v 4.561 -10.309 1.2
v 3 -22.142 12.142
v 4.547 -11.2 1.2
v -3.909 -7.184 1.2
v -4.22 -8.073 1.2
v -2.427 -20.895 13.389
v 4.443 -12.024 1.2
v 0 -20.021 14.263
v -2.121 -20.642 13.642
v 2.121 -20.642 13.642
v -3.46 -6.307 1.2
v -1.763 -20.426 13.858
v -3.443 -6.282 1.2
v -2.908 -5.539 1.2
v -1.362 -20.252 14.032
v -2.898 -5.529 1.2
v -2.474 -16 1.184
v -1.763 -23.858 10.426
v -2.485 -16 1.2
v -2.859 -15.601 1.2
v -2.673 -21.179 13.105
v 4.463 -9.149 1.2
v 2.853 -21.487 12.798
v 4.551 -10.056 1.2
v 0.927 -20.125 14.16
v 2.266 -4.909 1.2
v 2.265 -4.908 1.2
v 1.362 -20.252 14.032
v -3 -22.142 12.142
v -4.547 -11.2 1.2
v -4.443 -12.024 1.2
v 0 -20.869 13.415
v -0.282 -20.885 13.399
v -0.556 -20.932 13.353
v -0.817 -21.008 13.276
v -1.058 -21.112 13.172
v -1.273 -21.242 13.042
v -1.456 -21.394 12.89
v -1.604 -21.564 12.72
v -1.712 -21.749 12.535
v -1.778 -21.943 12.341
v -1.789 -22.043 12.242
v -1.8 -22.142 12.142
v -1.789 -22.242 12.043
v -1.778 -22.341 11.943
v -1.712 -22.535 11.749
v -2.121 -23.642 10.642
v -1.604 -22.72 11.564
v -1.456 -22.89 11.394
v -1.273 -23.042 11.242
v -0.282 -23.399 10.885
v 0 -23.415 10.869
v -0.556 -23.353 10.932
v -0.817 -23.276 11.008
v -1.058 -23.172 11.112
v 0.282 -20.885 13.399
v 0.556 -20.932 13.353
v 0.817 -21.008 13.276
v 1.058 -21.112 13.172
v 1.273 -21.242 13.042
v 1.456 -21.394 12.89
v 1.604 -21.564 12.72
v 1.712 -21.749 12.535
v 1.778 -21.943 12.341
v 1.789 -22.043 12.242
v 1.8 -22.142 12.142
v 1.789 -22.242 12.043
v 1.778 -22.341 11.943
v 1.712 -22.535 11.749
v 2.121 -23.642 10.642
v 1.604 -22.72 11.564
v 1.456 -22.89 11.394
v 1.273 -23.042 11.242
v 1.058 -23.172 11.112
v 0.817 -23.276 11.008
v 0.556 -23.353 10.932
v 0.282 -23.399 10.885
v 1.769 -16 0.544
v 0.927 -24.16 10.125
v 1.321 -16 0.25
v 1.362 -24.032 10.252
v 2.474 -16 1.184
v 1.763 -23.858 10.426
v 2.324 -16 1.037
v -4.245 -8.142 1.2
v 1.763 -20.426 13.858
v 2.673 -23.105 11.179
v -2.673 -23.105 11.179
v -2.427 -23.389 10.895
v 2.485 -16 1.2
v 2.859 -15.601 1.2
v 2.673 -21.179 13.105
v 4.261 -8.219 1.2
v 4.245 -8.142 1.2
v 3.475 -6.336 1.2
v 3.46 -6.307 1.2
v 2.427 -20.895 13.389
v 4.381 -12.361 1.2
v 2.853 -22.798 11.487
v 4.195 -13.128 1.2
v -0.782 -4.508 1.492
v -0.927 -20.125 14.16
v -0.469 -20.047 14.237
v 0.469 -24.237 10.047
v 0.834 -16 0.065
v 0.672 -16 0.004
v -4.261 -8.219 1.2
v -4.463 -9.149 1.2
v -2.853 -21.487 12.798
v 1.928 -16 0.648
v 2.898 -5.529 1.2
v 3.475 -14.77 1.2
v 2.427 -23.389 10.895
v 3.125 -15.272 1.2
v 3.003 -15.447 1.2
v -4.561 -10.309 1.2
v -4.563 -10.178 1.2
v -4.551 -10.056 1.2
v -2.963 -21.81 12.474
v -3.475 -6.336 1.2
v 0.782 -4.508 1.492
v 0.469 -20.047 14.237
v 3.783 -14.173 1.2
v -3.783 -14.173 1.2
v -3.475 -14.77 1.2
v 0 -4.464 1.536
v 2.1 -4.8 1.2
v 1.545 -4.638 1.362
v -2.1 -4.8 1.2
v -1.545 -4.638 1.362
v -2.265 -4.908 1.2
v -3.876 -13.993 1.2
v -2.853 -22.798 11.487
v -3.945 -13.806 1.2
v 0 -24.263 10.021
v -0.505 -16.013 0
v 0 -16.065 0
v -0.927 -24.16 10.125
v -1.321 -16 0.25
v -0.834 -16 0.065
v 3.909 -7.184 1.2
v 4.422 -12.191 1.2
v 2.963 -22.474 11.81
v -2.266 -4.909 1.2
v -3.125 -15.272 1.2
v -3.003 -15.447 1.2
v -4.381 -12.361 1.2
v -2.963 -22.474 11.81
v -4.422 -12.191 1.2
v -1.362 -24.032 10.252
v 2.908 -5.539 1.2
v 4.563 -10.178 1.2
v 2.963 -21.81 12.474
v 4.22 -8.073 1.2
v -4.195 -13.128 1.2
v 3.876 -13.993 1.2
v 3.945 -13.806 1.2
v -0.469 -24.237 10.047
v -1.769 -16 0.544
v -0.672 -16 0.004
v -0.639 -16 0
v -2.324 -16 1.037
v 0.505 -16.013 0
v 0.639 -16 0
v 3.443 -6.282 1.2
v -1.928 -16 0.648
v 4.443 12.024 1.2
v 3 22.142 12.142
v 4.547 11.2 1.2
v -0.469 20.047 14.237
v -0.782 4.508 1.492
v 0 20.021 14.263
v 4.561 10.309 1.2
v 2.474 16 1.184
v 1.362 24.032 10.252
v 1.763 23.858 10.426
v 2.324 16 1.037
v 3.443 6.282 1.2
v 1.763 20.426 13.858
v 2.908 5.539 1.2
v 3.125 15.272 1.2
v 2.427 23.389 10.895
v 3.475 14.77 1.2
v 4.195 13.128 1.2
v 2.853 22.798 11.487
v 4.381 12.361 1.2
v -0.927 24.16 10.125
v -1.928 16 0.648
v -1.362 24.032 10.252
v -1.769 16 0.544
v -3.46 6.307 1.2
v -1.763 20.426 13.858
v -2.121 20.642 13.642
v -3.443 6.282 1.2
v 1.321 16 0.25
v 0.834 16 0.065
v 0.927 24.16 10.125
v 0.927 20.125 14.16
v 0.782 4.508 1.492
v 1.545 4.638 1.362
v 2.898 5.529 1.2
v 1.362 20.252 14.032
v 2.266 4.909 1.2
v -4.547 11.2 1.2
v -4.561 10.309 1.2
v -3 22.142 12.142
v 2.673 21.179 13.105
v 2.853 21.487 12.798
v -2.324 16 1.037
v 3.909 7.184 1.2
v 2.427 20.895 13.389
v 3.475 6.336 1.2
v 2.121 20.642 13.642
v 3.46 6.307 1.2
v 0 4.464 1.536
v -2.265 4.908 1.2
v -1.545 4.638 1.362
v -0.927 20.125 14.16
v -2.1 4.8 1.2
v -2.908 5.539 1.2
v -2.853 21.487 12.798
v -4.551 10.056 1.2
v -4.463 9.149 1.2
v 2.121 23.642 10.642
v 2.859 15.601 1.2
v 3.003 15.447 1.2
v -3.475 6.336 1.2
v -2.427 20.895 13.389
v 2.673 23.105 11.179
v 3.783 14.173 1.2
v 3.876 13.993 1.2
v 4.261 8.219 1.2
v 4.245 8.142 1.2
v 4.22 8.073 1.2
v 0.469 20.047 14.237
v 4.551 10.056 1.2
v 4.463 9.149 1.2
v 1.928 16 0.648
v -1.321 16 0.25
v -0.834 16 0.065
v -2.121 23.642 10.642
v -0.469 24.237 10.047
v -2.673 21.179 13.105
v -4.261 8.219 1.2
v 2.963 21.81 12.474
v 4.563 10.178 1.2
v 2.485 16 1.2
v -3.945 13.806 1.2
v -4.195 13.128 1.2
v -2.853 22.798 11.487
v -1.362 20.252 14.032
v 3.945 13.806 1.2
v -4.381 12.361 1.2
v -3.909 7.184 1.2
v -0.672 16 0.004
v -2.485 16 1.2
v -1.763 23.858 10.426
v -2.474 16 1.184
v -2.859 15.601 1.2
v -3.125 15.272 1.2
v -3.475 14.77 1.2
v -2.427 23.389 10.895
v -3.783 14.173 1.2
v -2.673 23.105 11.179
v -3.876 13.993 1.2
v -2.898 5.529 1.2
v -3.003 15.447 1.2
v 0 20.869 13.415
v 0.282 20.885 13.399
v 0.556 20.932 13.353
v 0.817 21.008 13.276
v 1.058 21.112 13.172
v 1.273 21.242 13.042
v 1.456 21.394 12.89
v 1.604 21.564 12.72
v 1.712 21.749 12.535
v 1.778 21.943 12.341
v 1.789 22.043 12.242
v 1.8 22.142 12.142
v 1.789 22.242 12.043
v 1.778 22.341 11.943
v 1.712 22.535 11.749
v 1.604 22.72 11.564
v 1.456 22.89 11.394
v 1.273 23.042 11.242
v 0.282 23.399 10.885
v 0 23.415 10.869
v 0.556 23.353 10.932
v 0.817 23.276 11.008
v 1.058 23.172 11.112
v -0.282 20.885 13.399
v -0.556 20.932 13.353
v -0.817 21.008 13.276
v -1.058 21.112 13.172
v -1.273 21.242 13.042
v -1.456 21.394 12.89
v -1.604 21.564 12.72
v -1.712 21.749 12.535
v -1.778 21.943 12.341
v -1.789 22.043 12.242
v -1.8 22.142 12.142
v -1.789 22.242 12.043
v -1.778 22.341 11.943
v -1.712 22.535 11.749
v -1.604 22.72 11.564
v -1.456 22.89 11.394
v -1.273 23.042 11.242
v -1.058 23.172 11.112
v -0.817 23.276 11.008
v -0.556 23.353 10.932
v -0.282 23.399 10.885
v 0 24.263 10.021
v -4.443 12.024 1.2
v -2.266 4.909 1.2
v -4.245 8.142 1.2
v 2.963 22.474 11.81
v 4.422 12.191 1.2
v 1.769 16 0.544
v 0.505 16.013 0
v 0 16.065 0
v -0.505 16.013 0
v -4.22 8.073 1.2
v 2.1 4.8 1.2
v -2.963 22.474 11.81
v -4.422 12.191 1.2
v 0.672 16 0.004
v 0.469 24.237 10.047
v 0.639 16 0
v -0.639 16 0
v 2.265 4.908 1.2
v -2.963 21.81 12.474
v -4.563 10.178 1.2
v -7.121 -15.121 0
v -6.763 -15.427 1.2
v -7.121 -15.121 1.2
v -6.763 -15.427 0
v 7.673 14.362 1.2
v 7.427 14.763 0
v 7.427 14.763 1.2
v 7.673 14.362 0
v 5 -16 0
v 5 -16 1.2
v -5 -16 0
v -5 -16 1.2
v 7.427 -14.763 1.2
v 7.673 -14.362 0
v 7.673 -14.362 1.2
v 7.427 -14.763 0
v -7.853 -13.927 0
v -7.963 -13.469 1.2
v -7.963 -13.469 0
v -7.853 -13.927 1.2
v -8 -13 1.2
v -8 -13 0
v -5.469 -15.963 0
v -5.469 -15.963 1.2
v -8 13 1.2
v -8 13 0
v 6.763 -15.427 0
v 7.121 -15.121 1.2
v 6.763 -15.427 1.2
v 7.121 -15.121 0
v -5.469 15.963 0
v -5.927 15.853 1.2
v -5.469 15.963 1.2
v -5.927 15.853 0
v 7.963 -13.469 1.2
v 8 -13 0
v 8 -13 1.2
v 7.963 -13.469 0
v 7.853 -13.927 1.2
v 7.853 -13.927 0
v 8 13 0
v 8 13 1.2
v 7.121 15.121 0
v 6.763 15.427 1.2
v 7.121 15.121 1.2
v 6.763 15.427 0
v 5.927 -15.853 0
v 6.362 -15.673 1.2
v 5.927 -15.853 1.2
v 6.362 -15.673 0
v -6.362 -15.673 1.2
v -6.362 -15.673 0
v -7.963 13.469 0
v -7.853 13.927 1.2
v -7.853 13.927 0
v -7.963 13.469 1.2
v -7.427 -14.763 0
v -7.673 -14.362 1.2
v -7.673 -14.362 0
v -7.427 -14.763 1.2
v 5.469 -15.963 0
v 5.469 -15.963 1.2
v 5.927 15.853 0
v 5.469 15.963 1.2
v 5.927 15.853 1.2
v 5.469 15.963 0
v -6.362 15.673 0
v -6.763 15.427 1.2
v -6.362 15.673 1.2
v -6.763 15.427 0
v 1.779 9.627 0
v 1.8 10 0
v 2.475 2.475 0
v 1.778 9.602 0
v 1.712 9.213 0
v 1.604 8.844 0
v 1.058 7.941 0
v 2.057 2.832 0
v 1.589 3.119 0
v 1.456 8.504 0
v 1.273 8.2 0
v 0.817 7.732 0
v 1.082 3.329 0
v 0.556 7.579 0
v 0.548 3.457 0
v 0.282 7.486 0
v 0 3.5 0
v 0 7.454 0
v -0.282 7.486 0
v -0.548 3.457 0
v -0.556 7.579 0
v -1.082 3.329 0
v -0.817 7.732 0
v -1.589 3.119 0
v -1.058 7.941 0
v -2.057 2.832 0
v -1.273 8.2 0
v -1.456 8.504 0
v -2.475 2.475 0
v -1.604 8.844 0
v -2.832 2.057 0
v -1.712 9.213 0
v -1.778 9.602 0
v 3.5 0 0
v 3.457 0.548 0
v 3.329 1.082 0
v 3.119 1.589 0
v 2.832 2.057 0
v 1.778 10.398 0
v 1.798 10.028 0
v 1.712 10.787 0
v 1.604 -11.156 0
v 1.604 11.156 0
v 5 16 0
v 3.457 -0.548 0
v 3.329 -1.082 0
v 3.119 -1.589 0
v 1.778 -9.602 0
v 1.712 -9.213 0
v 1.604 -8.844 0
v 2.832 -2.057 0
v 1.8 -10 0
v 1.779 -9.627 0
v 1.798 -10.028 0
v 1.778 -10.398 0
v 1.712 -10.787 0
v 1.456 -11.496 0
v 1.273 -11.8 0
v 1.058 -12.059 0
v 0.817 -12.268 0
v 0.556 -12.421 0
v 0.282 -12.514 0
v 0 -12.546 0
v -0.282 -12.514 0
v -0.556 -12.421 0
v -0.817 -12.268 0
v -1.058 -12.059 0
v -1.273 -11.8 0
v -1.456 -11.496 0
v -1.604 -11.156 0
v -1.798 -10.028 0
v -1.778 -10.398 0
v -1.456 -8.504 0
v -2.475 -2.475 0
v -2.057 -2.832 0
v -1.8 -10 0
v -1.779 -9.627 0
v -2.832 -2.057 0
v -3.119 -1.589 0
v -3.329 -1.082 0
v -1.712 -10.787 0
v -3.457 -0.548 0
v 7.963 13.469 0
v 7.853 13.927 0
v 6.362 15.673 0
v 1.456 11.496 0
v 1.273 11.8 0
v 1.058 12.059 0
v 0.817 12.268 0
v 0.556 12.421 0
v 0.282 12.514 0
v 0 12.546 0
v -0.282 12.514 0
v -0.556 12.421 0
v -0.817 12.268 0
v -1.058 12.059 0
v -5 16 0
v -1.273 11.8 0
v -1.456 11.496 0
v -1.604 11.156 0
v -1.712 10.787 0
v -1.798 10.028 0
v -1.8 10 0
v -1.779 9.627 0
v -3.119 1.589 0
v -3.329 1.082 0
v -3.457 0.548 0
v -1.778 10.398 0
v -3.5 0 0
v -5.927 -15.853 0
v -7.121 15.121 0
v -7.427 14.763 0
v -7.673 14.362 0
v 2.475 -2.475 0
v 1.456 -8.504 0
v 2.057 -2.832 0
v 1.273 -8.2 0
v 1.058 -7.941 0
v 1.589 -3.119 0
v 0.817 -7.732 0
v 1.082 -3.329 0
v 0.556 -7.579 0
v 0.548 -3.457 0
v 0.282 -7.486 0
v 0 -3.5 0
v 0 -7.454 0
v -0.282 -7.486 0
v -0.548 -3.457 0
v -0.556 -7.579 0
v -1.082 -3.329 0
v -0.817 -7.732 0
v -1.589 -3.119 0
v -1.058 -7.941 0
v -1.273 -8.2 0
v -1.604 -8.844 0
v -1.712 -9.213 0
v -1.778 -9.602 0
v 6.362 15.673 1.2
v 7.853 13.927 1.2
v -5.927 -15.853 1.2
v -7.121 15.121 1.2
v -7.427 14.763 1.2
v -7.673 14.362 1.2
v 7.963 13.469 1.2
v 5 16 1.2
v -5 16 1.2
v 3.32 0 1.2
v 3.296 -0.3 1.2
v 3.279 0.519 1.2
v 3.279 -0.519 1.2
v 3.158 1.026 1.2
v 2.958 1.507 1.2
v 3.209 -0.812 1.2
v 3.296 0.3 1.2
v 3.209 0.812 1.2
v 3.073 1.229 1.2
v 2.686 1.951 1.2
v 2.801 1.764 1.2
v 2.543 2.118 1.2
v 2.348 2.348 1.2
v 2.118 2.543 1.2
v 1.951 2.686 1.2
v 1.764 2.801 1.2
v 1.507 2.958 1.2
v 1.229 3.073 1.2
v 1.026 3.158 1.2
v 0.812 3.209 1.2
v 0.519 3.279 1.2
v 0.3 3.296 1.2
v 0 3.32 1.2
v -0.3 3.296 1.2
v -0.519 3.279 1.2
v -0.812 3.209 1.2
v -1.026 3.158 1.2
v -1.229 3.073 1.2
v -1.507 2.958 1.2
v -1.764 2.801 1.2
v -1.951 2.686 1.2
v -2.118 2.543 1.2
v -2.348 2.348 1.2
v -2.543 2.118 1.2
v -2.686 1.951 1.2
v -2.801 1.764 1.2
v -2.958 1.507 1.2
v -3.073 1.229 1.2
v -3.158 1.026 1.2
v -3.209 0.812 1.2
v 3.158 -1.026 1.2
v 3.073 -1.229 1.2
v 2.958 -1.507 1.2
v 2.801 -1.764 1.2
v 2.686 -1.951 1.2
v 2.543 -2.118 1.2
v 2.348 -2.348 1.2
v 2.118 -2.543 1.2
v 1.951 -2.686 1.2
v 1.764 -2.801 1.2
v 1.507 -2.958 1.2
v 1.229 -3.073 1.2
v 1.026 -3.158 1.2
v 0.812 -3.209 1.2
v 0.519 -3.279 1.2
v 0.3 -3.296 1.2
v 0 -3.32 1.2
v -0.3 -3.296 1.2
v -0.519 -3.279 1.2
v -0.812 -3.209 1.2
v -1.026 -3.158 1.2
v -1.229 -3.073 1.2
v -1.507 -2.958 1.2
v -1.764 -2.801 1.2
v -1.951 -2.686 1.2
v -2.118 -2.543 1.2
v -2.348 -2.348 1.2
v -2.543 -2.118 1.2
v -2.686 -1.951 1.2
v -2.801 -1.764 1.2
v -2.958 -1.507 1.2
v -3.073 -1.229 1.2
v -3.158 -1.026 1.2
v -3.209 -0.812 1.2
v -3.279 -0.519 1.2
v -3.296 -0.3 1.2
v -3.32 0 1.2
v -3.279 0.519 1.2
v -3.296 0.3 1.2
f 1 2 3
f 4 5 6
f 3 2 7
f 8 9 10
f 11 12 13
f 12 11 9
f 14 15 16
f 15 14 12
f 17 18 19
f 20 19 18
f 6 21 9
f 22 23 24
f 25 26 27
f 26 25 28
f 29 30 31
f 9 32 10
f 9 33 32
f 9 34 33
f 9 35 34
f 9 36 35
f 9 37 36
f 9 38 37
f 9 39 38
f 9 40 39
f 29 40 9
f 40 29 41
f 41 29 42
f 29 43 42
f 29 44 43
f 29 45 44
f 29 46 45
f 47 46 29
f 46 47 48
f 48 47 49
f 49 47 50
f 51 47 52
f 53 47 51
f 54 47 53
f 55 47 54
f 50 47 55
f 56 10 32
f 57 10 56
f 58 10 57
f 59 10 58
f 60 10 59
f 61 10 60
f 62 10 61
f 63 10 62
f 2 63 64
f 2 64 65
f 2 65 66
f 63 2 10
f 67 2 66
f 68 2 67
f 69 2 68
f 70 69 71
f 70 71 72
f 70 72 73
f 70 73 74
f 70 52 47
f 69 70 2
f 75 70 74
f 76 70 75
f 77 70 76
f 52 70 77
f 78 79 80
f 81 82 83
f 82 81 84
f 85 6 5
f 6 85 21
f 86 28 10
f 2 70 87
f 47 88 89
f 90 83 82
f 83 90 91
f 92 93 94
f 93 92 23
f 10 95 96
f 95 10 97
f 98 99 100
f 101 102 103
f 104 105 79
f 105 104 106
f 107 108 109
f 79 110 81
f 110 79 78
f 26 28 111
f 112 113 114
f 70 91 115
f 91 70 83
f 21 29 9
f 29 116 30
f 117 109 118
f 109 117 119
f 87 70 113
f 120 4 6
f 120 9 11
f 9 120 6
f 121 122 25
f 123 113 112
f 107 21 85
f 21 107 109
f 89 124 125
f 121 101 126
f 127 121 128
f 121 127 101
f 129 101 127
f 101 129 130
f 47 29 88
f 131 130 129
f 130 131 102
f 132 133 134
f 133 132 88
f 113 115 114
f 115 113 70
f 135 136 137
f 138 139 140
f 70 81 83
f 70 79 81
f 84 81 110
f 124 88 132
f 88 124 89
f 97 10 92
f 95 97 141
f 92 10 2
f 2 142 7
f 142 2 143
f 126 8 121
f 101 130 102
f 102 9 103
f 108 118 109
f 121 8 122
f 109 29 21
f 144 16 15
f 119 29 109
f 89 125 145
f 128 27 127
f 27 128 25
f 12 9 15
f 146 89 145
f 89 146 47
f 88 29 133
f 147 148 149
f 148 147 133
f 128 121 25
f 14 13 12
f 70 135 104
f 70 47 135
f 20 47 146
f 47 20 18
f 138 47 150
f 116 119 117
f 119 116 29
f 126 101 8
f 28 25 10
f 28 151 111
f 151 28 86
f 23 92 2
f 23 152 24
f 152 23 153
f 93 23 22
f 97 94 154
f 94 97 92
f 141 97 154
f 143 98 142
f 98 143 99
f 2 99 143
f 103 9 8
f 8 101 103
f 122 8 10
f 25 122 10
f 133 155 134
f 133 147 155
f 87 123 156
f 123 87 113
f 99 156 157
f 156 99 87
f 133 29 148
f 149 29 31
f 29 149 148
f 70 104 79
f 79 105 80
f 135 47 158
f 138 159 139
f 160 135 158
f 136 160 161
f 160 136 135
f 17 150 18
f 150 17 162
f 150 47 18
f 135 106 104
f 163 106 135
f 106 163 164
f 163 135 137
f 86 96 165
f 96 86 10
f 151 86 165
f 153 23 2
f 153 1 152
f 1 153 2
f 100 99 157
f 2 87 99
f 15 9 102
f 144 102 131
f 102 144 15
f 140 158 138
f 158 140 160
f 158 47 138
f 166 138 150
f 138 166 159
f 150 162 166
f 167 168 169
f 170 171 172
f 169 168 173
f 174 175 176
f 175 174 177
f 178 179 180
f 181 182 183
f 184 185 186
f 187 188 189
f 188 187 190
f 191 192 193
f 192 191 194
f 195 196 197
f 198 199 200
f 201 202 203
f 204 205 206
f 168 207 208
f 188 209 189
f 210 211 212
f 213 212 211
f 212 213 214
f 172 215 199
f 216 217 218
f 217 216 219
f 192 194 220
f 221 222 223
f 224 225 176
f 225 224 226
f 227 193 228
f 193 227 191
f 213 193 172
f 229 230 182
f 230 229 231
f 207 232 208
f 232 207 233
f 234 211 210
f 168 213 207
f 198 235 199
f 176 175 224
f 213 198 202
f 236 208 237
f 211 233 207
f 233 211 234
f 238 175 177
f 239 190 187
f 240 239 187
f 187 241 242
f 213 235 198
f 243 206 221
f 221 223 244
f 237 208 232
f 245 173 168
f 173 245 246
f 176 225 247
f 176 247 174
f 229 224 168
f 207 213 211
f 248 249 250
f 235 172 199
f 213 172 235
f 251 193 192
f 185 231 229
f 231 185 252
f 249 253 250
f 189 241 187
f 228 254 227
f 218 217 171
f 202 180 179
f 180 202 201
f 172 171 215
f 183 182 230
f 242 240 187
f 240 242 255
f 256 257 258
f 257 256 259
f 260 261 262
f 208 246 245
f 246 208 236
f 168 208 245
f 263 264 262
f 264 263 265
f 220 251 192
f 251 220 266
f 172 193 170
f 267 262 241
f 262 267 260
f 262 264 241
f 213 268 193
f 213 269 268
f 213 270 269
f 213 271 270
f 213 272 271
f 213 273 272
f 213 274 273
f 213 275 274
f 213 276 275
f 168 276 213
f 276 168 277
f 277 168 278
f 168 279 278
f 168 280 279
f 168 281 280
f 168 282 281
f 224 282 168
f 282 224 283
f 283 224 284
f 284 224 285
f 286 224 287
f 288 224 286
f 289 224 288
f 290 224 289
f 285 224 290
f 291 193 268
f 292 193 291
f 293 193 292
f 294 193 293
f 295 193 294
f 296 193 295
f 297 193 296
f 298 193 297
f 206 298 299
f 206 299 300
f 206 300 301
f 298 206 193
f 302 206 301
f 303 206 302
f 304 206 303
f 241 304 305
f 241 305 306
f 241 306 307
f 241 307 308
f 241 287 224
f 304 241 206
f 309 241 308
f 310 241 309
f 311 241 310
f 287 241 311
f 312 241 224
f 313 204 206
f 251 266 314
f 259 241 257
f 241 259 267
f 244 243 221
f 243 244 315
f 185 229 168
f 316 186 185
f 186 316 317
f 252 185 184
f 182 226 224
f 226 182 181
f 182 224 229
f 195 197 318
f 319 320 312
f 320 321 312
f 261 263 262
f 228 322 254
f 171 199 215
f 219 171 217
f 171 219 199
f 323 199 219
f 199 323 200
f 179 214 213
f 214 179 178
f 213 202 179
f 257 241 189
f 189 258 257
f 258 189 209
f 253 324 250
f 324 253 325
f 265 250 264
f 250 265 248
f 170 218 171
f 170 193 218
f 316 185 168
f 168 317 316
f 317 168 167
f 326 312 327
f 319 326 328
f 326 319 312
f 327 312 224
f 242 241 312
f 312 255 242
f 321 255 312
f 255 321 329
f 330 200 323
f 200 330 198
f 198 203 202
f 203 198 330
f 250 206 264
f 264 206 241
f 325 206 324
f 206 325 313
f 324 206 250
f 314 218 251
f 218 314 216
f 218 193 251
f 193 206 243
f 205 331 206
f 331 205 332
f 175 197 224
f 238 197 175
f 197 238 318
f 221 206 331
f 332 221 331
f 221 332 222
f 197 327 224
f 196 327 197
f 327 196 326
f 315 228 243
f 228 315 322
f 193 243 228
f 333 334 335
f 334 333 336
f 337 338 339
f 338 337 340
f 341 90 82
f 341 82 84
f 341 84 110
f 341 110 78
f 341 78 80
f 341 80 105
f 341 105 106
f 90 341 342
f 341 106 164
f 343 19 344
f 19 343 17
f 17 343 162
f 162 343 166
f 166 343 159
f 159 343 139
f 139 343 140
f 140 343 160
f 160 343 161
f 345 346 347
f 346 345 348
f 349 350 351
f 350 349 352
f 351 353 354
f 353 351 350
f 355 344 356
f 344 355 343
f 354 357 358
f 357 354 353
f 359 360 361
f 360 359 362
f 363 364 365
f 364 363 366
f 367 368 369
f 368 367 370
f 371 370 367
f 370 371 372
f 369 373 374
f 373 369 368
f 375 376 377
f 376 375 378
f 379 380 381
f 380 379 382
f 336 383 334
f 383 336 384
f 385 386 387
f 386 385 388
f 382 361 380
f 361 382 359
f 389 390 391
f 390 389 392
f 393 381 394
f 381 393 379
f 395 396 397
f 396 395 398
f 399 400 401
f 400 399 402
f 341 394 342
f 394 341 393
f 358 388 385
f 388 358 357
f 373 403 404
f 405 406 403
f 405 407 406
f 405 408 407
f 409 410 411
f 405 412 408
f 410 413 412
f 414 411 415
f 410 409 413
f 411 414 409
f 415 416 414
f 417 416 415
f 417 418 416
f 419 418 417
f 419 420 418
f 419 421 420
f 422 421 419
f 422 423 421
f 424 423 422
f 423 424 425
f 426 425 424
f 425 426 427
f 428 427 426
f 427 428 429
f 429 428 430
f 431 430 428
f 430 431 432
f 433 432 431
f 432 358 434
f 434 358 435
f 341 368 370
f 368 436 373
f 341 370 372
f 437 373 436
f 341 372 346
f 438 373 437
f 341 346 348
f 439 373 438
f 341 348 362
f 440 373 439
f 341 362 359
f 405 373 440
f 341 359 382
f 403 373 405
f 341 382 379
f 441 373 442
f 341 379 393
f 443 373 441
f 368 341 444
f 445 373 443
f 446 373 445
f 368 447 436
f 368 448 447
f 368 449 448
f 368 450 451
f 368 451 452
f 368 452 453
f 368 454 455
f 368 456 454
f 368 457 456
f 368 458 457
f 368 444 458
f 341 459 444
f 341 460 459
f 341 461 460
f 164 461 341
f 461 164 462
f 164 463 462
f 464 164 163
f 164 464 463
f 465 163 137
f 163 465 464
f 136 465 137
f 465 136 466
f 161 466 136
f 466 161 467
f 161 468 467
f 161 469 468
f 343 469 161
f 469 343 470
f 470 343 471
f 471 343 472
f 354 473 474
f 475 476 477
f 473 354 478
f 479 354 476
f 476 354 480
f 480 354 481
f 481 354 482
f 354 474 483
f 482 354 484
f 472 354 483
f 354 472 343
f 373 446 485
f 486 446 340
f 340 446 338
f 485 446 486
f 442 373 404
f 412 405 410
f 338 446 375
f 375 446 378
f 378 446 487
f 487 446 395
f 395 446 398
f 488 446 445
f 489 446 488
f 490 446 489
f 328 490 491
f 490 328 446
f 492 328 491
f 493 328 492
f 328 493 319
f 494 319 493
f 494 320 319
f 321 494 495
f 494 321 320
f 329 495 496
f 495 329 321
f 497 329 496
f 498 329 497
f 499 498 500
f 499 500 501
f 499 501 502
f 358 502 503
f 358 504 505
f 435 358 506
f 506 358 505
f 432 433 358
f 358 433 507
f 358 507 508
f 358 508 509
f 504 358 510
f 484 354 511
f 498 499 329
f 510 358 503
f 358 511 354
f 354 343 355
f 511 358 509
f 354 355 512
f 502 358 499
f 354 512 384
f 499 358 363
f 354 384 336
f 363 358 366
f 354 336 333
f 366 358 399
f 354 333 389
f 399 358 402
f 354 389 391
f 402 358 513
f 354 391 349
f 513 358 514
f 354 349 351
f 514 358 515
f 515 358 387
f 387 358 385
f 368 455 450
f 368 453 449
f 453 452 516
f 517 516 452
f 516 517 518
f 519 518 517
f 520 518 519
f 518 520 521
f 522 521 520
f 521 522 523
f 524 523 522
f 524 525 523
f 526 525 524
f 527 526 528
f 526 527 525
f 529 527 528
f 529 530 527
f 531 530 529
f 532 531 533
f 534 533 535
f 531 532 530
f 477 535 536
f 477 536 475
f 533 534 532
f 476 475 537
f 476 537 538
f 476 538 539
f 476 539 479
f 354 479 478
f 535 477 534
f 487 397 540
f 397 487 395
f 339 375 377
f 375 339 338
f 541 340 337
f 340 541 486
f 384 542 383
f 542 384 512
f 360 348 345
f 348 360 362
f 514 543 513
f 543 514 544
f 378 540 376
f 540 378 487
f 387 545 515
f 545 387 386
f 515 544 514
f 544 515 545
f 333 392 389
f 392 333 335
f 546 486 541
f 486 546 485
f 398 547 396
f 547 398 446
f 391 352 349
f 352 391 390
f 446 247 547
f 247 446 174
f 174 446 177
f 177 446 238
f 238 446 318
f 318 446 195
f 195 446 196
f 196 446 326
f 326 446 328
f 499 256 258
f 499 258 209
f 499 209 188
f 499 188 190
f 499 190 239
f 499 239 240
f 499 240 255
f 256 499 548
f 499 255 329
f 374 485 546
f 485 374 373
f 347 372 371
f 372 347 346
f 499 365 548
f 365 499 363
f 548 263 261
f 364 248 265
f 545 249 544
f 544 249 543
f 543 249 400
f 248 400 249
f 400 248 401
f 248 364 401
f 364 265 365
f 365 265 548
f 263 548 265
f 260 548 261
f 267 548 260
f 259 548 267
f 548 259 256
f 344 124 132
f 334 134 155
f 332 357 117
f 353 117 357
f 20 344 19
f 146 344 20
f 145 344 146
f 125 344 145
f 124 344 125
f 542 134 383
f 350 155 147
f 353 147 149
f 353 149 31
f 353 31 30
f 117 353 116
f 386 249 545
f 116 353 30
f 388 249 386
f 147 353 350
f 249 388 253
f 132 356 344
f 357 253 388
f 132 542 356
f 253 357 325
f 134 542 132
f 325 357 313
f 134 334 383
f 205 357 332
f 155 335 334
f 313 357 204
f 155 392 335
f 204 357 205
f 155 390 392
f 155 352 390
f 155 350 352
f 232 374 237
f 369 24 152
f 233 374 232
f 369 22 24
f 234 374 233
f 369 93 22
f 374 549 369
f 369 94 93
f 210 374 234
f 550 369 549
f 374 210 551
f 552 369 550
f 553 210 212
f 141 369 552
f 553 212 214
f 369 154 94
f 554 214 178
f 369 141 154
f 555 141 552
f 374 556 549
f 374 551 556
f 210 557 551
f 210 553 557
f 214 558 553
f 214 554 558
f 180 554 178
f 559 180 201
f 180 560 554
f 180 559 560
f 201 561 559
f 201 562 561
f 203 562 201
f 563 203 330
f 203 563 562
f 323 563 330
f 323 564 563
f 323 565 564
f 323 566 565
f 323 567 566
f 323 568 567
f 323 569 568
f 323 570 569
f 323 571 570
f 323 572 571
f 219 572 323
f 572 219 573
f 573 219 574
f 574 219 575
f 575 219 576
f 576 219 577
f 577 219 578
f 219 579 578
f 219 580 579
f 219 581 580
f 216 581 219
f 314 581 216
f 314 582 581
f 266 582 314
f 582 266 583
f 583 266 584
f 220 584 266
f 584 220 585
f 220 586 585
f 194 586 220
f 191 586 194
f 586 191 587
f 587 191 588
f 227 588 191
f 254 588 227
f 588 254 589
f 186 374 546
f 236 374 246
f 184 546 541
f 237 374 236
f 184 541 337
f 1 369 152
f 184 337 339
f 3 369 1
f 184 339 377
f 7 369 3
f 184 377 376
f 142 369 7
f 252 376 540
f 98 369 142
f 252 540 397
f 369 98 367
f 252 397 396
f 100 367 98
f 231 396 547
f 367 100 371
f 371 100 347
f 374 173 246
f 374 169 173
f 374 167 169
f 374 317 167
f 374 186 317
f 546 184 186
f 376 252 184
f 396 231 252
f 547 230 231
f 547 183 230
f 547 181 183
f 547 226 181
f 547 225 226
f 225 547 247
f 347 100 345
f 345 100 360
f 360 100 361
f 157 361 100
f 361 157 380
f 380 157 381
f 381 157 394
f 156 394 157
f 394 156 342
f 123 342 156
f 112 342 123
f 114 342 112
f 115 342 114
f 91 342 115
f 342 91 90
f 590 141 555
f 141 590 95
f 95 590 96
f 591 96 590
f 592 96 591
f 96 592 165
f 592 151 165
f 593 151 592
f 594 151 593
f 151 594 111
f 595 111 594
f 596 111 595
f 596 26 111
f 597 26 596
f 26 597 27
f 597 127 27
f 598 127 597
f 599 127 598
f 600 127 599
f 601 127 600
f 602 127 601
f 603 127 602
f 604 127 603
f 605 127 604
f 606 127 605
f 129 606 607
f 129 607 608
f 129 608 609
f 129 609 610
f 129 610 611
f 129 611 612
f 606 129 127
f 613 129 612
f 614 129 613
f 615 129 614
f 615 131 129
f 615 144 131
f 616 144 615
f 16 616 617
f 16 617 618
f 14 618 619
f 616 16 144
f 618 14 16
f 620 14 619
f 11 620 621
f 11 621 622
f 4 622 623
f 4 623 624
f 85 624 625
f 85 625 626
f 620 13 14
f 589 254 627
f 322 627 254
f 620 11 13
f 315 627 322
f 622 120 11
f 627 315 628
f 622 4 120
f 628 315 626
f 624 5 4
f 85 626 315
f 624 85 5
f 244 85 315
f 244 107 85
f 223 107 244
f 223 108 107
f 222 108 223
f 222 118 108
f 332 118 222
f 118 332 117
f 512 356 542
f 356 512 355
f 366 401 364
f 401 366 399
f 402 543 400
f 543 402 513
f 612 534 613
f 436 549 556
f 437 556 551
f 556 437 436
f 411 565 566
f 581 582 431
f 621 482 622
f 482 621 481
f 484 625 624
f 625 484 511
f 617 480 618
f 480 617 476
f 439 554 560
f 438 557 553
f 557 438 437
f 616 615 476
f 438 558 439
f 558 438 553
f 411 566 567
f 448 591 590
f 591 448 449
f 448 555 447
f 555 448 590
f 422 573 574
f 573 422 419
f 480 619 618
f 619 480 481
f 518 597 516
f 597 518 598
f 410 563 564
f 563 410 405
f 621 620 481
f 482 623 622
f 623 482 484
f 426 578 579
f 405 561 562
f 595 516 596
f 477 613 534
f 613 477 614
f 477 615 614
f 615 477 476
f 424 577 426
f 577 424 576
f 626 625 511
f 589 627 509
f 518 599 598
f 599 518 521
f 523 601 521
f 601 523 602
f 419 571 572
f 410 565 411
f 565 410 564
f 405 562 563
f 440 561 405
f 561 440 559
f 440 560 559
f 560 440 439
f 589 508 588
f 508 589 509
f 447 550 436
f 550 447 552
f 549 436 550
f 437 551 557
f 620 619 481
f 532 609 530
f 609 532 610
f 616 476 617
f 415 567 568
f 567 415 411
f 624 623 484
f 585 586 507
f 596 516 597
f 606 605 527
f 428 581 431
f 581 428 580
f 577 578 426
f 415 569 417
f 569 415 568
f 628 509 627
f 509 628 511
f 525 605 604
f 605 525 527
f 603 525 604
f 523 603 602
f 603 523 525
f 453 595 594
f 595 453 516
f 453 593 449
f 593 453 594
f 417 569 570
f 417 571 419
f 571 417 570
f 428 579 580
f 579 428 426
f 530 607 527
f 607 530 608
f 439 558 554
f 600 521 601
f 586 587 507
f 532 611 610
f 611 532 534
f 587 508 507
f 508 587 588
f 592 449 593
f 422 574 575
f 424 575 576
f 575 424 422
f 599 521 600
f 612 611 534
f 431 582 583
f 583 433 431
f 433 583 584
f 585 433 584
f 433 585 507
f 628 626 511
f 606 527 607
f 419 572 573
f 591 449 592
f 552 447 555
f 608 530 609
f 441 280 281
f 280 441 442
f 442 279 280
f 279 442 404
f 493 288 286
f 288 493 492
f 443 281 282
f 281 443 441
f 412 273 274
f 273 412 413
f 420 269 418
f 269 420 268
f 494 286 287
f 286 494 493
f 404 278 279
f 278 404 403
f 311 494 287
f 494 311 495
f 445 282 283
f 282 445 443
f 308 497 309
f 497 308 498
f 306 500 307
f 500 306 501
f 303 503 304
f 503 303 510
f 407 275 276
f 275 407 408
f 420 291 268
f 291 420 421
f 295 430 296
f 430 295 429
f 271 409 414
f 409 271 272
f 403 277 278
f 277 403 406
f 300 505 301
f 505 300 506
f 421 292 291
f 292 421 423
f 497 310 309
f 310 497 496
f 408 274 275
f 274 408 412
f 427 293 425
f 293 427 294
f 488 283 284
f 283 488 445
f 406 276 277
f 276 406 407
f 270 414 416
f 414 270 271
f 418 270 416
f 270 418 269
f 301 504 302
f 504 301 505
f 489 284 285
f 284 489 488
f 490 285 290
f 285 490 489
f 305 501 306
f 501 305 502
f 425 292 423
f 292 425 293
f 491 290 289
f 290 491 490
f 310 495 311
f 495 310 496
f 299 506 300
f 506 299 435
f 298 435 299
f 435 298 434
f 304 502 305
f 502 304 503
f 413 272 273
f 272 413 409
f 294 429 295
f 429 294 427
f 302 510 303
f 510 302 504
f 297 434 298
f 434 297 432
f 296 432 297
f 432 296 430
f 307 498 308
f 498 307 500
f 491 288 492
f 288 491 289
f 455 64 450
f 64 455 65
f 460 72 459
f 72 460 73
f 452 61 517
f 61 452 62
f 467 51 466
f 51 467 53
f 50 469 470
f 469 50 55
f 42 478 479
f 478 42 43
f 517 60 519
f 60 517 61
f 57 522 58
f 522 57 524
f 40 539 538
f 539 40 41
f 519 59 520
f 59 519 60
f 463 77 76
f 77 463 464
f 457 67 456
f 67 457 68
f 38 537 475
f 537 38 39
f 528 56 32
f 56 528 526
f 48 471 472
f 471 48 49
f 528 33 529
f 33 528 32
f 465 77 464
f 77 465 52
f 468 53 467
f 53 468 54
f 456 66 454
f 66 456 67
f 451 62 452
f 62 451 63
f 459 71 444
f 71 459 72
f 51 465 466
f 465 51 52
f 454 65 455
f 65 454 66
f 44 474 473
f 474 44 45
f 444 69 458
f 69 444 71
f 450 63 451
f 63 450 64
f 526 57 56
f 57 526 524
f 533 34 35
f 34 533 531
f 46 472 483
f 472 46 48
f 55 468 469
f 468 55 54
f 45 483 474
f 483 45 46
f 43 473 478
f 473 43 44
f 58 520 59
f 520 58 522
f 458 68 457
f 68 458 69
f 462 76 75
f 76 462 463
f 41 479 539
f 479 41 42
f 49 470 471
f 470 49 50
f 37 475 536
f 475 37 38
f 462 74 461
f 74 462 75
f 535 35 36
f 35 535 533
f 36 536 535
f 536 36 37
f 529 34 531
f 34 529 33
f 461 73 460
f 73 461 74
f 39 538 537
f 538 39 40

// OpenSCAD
/*
Antenna holder for Armattan F1-5 (c) by Jorge Monteiro

Antenna holder for Armattan F1-5 is licensed under a
Creative Commons Attribution-ShareAlike 4.0 International.

You should have received a copy of the license along with this
work.  If not, see <http://creativecommons.org/licenses/by-sa/4.0/>.
*/


$fn = 40*1;
/* [Basics] */
// Length of the antena tube
antennaLength = 20;
// Outer diameter of the antena tube
antennaOuter = 3;
// Inner diameter of the antena tube
antennaInner = 1.8;
// Thickness of the base
baseThickness = 1.2;
// Width of the base
width=16;

difference() {
    union() {
        roundedCube(width, 32, baseThickness, 3);

        translate([0, 0, -5]) 
            union() {
                // Now draw the antenna tubes
                translate([0,-8,3]){
                    rotate([45, 0, 0]){
                        cylinder(antennaLength, antennaOuter+2, antennaOuter);
                    };
                };
                translate([0,8,3]){
                    rotate([-45, 0, 0]){
                        cylinder(antennaLength, antennaOuter+2, antennaOuter);
                    };
                };
            };
        };
        translate([0, 0, -5]) cube([100,100,10], true);
        cylinder(2, 3.5, 3.2);
        translate([0,8,-2])
            rotate([-45, 0, 0])
                cylinder(antennaLength*2, antennaInner, antennaInner);
        translate([0,-8,-2])
            rotate([45, 0, 0])
                cylinder(antennaLength*2, antennaInner, antennaInner);
        
        
    };

module drawTube(distance, outer, inner) {
    difference() {
        cylinder(distance, outer, outer);
        cylinder(distance, inner, inner);
    };
};

//roundedCube(36,36,1.2,3);
module roundedCube(xdim, ydim, zdim, rdim) {
    translate([-xdim/2,-ydim/2,0]){
        hull(){
            translate([rdim,rdim,0]) cylinder(r=rdim, h=zdim);
            translate([xdim-rdim,rdim,0]) cylinder(r=rdim, h=zdim);

            translate([rdim,ydim-rdim,0]) cylinder(r=rdim, h=zdim);
            translate([xdim-rdim,ydim-rdim,0]) cylinder(r=rdim, h=zdim);

        };
    };
};
